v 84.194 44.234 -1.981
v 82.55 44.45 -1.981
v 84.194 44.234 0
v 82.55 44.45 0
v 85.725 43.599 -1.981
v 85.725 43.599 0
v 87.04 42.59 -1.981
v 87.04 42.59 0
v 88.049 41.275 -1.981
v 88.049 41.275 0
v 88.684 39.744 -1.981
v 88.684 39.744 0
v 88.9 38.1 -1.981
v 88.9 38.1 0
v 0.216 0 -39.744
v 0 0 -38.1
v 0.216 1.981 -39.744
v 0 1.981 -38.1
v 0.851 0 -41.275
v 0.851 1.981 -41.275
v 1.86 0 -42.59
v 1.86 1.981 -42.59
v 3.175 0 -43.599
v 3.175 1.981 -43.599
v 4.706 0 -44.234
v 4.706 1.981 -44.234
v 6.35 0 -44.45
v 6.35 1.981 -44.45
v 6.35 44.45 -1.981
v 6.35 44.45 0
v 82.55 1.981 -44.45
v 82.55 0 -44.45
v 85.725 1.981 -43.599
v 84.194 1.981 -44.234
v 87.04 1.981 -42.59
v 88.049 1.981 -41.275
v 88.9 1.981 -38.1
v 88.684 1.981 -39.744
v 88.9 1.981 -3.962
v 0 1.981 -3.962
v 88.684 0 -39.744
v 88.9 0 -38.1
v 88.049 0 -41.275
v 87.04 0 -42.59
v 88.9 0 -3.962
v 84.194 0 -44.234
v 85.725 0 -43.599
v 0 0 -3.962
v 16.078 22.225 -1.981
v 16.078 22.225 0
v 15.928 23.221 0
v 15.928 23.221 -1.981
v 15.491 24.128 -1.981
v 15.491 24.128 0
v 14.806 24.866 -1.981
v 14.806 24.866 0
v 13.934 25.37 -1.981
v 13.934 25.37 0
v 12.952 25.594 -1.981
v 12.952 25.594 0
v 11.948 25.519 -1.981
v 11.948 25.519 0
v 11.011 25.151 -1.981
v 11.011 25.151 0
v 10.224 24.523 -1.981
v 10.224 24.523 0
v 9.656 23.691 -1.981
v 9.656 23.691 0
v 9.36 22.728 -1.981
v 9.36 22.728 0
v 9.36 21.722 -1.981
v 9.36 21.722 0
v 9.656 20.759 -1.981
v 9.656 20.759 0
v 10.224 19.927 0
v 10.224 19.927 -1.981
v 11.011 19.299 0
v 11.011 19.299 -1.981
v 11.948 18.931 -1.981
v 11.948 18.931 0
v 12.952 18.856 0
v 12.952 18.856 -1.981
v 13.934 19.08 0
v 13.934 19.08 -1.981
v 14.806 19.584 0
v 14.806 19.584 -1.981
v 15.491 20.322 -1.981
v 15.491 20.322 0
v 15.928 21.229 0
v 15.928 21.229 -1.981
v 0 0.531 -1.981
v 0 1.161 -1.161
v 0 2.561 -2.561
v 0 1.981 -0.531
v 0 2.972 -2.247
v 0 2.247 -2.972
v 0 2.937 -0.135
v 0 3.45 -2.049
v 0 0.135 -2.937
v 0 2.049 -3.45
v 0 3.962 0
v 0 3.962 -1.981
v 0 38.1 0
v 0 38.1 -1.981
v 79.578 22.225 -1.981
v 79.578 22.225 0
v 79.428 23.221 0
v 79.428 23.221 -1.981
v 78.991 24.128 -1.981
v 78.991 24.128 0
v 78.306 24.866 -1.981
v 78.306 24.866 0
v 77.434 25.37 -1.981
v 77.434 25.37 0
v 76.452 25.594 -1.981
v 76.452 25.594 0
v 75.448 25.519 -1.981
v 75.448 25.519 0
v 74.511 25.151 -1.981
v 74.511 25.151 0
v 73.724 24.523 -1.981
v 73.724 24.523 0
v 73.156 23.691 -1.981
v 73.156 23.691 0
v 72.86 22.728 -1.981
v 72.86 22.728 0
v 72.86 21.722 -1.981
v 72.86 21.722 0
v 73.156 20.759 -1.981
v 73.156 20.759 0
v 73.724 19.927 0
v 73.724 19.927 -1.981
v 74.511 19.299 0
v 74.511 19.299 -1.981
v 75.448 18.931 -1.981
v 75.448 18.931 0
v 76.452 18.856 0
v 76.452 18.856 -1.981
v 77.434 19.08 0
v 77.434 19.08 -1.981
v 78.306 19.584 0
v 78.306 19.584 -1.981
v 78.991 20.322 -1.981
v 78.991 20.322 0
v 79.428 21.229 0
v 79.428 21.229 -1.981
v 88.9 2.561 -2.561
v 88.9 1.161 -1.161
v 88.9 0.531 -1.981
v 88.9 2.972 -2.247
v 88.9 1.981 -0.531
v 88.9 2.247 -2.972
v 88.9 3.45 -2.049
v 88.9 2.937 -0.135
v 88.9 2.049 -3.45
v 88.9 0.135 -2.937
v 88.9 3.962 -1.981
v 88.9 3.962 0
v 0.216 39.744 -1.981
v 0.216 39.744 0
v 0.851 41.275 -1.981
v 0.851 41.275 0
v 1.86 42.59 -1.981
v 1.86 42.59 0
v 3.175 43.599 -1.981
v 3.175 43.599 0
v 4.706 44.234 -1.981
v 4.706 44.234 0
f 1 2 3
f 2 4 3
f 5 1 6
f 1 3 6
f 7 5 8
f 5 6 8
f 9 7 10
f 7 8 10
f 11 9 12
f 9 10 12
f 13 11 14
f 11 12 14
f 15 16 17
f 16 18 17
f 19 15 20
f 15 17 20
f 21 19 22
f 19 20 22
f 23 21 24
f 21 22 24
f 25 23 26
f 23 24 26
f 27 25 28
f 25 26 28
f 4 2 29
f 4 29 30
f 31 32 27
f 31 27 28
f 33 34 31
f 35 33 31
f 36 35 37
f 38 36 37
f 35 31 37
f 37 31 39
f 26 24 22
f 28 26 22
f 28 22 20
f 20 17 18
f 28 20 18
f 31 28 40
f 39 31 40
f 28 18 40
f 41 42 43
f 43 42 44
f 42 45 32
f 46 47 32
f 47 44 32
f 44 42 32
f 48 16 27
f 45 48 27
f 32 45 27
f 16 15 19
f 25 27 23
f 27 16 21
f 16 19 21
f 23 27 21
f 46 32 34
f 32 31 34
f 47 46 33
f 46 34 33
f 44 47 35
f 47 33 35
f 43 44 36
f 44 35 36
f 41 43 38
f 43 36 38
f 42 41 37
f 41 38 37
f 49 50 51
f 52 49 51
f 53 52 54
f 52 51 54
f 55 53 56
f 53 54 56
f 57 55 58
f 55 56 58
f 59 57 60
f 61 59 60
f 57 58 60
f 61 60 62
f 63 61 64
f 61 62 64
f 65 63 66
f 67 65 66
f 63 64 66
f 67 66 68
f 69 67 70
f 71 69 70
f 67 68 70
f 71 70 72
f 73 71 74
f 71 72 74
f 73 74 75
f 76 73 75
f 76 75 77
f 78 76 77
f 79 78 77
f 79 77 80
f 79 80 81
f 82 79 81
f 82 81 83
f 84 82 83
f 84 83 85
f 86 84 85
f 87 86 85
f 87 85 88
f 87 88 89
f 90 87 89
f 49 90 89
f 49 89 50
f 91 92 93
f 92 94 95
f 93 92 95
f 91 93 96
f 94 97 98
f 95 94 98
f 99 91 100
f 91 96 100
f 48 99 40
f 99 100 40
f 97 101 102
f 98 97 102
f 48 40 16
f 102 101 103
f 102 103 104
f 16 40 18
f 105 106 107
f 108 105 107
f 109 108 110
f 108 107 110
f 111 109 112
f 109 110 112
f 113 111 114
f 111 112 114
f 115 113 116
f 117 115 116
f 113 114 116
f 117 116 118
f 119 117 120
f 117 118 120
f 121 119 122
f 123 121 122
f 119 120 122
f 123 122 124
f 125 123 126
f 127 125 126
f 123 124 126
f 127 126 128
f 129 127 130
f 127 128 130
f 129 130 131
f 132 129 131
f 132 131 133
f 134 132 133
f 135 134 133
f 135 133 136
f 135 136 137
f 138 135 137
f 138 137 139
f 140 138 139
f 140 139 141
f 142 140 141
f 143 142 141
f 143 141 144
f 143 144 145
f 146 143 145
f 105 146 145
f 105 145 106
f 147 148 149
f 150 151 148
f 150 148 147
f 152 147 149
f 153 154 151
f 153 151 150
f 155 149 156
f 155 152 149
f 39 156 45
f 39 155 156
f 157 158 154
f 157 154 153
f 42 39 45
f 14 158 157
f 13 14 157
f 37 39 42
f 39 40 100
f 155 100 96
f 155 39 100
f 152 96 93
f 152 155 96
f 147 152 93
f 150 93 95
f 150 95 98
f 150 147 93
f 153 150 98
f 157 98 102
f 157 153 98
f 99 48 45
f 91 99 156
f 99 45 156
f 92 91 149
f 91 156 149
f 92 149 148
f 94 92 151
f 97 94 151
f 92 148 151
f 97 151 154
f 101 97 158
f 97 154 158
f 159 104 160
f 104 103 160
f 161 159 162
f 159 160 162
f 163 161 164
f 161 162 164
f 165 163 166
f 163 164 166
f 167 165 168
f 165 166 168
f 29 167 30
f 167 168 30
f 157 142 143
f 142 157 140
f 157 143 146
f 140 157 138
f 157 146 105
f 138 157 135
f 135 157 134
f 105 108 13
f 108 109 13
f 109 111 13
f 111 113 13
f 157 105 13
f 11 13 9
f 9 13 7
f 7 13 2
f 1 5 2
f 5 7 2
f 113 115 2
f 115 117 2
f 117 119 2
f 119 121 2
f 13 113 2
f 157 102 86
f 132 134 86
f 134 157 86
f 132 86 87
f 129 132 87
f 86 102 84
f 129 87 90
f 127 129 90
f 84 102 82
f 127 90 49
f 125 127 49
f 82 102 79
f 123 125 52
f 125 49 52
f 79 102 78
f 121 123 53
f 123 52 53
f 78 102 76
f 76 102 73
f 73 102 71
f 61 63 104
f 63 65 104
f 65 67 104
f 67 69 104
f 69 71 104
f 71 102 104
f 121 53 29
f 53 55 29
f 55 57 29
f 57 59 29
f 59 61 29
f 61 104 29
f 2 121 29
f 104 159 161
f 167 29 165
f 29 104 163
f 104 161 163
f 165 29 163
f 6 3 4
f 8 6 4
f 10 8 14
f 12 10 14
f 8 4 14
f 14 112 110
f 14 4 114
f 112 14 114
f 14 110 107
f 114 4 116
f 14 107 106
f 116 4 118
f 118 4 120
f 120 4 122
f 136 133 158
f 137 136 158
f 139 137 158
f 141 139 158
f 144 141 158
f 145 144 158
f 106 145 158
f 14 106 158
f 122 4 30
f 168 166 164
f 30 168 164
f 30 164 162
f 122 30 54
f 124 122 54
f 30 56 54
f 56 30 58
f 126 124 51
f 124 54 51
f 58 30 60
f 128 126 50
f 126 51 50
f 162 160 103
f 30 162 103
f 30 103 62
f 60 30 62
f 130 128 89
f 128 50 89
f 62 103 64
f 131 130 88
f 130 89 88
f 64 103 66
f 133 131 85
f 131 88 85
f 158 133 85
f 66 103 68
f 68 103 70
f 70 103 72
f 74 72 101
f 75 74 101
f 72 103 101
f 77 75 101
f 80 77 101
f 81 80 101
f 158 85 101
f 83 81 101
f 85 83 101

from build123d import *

# Parameters (mm, degrees)
BOSS_EXTRUDE1_DEPTH = 88.9
FILLET1_R           = 1.9812
FILLET2_R           = 3.9624
FILLET3_R           = 6.35
SKETCH2_R           = 3.3782
CUT_EXTRUDE1_DEPTH  = 88.9


with BuildPart() as part:
    # Sketch1 → Boss-Extrude1 (new body)
    with BuildSketch(Plane(origin=(0, 0, 0), x_dir=(0, 0, -1), z_dir=(1, 0, 0))):
        Polygon((0, 44.45), (0, 0), (44.45, 0), (44.45, 1.9812), (1.9812, 1.9812), (1.9812, 44.45), align=None)
    extrude(amount=BOSS_EXTRUDE1_DEPTH)

    # Fillet1
    fillet1_edges = [part.edges().sort_by_distance(p)[0] for p in [
        (44.45, 1.9812, -1.9812),
    ]]
    fillet(fillet1_edges, radius=FILLET1_R)

    # Fillet2
    fillet2_edges = [part.edges().sort_by_distance(p)[0] for p in [
        (44.45, 0, 0),
    ]]
    fillet(fillet2_edges, radius=FILLET2_R)

    # Fillet3
    fillet3_edges = [part.edges().sort_by_distance(p)[0] for p in [
        (88.9, 0.9906, -44.45),
        (88.9, 44.45, -0.9906),
        (0, 0.9906, -44.45),
        (0, 44.45, -0.9906),
    ]]
    fillet(fillet3_edges, radius=FILLET3_R)

    # Sketch2 → Cut-Extrude1 (cut)
    with BuildSketch(Plane.XY):
        with Locations((12.7, 22.225)):
            Circle(SKETCH2_R)
        with Locations((76.2, 22.225)):
            Circle(SKETCH2_R)
    extrude(amount=-CUT_EXTRUDE1_DEPTH, mode=Mode.SUBTRACT)


solid = part.part
